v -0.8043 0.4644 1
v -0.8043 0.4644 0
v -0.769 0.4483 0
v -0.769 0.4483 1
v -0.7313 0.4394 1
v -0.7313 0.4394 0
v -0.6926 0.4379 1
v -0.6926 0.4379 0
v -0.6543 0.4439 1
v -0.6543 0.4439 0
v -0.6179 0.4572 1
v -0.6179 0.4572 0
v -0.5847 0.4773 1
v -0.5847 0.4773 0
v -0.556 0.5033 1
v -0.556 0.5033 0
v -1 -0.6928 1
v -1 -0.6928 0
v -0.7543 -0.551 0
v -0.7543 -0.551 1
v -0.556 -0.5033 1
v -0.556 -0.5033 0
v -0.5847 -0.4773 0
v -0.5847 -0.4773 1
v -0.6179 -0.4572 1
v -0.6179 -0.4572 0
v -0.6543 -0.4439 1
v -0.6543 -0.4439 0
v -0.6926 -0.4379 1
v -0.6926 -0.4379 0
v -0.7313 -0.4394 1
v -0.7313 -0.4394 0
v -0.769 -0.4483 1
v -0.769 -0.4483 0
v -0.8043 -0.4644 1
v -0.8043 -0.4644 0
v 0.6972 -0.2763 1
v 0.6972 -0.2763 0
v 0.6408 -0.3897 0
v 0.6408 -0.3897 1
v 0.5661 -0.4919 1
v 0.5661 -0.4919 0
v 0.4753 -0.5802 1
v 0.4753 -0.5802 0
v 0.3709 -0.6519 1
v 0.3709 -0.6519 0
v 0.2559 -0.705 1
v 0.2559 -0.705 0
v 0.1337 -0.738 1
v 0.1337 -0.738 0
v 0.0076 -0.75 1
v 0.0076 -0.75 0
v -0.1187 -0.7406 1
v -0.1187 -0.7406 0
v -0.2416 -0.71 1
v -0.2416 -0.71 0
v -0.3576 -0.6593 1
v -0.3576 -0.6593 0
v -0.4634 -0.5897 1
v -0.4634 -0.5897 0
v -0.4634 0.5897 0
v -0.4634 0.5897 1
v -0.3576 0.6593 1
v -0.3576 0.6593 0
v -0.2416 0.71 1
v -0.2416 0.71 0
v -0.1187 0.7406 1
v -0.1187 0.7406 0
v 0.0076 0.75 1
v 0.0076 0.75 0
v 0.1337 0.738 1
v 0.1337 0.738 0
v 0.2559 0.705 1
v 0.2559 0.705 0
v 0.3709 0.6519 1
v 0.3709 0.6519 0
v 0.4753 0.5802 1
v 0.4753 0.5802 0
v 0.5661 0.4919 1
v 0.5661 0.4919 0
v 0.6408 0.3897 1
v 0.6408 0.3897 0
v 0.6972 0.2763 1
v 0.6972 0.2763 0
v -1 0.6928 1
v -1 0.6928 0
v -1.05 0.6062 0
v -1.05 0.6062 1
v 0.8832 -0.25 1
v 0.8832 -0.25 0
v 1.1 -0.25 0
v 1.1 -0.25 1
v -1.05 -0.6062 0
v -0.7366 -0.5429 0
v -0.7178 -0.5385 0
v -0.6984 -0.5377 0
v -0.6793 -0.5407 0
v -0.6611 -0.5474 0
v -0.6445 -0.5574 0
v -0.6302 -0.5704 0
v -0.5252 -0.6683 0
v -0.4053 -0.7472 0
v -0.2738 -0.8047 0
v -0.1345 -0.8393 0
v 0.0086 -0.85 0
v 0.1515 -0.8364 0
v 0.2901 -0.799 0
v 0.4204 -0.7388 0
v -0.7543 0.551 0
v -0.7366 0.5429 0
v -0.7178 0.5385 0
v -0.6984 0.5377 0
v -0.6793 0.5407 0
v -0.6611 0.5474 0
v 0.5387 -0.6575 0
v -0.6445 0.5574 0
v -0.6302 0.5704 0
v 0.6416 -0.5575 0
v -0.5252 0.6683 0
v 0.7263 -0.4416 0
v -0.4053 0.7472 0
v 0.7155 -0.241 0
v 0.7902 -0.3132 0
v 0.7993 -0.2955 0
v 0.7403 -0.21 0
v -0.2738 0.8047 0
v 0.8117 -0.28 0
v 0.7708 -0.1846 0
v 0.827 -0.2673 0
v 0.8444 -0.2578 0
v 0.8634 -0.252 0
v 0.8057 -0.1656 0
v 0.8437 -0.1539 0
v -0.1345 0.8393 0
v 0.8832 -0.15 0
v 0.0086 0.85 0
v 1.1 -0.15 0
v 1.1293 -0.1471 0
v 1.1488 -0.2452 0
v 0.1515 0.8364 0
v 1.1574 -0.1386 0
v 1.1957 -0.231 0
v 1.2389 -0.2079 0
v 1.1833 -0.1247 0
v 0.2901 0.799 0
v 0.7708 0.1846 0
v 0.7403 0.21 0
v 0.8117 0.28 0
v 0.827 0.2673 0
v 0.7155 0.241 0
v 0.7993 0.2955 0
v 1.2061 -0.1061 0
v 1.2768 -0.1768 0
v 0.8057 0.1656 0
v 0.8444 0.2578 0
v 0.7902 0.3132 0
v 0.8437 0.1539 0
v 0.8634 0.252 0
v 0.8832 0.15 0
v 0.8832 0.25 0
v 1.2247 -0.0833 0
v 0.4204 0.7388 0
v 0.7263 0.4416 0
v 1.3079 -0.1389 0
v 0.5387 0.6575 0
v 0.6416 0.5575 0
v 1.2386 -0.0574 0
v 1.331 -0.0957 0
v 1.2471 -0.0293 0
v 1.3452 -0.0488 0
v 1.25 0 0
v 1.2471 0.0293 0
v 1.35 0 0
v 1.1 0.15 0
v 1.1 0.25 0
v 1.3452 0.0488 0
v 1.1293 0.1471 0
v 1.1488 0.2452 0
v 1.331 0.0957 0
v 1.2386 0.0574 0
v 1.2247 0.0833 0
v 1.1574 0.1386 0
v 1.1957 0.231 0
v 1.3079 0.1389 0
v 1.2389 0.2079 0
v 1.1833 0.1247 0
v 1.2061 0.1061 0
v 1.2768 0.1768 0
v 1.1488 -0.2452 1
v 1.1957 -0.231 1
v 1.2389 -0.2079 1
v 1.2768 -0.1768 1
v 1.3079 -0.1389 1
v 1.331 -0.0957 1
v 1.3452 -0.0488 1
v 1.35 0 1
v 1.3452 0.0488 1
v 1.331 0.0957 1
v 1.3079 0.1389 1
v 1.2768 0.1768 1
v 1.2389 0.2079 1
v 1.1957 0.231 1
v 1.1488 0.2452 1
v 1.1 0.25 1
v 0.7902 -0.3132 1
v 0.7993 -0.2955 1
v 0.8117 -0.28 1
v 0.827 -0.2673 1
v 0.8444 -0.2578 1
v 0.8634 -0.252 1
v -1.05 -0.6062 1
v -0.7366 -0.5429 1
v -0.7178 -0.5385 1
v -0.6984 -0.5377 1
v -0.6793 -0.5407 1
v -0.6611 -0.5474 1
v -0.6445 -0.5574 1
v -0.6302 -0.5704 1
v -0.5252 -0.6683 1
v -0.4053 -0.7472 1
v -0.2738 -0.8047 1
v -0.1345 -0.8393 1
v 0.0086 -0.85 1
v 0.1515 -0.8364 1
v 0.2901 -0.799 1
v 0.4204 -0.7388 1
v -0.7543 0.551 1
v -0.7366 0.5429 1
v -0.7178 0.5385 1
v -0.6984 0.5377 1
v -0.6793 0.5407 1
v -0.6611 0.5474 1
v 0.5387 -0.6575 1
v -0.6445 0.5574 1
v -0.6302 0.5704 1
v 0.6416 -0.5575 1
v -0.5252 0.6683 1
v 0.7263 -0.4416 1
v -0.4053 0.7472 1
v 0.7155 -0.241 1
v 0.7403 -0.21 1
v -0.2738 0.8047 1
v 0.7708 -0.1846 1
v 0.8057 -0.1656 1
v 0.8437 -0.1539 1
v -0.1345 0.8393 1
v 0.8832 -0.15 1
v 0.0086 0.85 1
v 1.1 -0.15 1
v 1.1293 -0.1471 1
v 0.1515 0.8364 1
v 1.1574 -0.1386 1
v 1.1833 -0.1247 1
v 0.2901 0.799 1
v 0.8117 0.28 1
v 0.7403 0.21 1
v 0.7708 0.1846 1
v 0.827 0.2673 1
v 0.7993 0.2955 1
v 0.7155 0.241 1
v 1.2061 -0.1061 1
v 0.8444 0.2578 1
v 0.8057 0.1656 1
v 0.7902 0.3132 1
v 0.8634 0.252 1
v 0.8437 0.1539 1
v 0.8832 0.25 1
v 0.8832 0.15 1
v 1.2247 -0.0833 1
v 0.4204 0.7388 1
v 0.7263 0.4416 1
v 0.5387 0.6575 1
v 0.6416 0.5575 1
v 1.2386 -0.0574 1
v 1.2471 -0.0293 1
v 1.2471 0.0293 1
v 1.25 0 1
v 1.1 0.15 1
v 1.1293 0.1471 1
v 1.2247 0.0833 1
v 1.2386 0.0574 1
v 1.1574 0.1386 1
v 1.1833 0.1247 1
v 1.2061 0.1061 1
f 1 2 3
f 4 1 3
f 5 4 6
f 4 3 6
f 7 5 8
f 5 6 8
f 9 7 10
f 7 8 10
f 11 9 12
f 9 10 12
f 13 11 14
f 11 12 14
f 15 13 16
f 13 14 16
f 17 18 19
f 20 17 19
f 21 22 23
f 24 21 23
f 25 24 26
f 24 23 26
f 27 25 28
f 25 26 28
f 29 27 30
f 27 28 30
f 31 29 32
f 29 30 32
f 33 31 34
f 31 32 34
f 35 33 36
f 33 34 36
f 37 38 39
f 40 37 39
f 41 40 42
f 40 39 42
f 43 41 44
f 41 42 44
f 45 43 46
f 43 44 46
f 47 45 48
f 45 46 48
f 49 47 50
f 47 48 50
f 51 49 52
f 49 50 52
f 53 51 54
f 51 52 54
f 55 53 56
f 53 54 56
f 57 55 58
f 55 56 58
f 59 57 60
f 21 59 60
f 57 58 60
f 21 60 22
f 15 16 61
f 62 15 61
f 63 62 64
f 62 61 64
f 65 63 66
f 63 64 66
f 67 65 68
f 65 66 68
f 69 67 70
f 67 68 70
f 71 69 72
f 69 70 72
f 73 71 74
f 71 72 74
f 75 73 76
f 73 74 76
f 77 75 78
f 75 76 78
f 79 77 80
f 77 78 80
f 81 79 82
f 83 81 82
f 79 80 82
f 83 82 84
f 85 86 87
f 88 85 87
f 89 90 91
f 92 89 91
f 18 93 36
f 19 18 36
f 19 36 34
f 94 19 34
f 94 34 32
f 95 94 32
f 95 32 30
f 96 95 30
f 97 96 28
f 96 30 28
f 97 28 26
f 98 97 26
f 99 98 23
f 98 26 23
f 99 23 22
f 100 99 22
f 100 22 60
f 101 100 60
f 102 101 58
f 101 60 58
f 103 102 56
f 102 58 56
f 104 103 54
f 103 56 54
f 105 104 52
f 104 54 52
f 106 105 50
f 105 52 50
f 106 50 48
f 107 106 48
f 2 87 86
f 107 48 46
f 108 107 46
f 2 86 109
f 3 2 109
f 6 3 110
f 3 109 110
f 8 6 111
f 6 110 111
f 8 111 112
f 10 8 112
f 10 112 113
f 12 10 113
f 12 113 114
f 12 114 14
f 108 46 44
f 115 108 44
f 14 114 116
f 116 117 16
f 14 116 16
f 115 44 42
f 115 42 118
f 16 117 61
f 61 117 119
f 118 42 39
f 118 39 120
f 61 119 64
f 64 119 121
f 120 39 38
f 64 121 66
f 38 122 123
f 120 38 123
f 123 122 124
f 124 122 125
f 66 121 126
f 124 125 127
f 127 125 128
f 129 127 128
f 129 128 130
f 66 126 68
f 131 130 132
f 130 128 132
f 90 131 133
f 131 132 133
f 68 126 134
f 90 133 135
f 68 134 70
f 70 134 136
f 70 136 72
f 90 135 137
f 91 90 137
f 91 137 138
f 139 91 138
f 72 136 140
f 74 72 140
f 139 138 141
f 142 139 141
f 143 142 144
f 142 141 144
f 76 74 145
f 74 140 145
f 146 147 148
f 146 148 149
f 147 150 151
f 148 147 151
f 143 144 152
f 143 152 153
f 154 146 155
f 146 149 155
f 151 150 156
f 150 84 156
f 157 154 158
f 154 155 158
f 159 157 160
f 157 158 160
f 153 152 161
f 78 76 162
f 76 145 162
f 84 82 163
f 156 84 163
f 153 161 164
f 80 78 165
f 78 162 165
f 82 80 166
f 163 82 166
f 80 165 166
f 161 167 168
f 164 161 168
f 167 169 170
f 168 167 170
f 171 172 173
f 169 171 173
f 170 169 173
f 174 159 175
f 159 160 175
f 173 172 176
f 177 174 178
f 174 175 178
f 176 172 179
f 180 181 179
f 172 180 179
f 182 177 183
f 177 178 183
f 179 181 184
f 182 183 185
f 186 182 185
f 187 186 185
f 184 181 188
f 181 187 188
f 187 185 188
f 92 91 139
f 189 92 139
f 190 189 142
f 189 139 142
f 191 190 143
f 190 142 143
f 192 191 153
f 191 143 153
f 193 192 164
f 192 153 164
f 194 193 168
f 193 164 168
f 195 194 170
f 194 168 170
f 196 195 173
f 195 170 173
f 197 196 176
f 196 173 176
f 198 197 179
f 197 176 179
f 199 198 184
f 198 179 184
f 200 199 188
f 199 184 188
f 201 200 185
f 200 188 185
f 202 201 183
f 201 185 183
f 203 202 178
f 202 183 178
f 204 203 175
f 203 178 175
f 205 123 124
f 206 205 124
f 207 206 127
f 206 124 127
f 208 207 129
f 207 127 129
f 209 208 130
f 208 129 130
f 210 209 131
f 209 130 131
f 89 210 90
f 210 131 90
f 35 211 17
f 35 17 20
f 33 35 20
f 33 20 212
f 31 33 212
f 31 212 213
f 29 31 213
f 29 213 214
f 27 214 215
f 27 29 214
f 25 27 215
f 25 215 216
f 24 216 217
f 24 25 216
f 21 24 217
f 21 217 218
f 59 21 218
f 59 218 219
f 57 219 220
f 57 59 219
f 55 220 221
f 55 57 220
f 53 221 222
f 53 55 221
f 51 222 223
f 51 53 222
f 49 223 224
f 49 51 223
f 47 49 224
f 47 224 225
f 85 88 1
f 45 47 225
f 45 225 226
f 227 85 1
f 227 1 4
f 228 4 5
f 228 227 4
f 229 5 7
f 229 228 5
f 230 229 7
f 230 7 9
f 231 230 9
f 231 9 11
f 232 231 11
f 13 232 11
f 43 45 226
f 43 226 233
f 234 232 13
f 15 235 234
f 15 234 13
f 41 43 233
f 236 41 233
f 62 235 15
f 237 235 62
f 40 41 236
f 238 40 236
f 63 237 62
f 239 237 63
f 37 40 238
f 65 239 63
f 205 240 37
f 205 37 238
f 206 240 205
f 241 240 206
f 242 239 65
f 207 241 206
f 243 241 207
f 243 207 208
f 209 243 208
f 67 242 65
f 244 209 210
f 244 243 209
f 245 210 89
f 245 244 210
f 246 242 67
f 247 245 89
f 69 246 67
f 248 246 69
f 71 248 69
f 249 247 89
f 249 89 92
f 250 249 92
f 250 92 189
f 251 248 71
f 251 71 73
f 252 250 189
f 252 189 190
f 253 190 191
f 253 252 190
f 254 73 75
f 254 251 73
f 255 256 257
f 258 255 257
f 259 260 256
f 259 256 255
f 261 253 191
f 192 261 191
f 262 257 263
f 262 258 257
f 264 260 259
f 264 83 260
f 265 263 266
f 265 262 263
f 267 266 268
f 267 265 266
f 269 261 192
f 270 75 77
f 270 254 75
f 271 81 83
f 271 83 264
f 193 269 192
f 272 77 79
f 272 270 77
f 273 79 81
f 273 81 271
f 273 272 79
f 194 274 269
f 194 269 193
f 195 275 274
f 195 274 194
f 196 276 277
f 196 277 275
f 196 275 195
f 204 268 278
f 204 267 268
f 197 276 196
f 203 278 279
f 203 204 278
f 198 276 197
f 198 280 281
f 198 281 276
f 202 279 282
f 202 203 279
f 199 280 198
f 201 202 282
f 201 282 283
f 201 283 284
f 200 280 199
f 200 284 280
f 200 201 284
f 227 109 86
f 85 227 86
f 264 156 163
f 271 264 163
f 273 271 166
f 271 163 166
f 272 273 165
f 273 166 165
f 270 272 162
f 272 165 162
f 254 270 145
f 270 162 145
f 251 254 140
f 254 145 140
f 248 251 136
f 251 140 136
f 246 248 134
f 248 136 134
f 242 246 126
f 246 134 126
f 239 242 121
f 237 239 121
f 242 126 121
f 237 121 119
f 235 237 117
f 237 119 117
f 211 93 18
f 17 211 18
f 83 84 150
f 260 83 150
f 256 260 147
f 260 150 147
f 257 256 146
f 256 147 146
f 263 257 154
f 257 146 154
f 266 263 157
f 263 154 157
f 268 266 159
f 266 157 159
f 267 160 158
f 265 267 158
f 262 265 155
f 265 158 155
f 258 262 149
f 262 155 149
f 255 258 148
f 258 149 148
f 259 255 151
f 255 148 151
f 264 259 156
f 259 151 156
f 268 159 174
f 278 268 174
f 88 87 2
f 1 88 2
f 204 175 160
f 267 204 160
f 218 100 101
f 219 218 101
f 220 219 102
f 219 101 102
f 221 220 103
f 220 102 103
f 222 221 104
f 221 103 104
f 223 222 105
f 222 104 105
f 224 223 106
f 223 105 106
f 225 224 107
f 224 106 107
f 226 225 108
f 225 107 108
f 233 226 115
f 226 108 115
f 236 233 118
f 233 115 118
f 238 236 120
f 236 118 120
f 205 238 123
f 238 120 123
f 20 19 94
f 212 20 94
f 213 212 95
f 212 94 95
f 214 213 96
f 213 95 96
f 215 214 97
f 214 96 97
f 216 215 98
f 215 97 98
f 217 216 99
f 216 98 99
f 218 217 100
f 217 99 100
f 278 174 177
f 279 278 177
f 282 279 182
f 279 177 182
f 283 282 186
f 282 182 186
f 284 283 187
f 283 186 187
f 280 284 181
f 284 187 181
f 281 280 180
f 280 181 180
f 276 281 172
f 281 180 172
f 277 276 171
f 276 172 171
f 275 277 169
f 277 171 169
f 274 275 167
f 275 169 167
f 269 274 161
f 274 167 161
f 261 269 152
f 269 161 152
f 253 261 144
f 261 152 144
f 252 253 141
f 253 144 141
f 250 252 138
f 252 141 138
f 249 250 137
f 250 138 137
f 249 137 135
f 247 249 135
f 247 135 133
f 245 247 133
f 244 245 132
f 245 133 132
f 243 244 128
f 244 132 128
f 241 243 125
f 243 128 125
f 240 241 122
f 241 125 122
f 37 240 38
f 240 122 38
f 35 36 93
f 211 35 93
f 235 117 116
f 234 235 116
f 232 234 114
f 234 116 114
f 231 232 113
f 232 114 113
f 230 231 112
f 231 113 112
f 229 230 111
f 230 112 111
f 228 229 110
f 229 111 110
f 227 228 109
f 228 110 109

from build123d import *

# Parameters (mm, degrees)
F1_DEPTH = 1


with BuildPart() as f1:
    # F0 (on Top) → F1 (new body)
    with BuildSketch(Plane.XY):
        with BuildLine():
            ThreePointArc((-0.556015, 0.503336), (0.133683, 0.73799), (0.697244, 0.276316))
            ThreePointArc((0.697244, 0.276316), (0.770786, 0.184566), (0.883176, 0.15))
            Line((0.883176, 0.15), (1.1, 0.15))
            ThreePointArc((1.1, 0.15), (1.25, 0), (1.1, -0.15))
            Line((1.1, -0.15), (0.883176, -0.15))
            ThreePointArc((0.883176, -0.15), (0.770786, -0.184566), (0.697244, -0.276316))
            ThreePointArc((0.697244, -0.276316), (0.133683, -0.73799), (-0.556015, -0.503336))
            ThreePointArc((-0.556015, -0.503336), (-0.673263, -0.43998), (-0.804285, -0.464354))
            Line((-0.804285, -0.464354), (-1.05, -0.606218))
            Line((-1.05, -0.606218), (-1, -0.69282))
            Line((-1, -0.69282), (-0.754285, -0.550957))
            ThreePointArc((-0.754285, -0.550957), (-0.688774, -0.53877), (-0.63015, -0.570448))
            ThreePointArc((-0.63015, -0.570448), (0.151507, -0.836388), (0.79021, -0.313158))
            ThreePointArc((0.79021, -0.313158), (0.826981, -0.267283), (0.883176, -0.25))
            Line((0.883176, -0.25), (1.1, -0.25))
            ThreePointArc((1.1, -0.25), (1.35, 0), (1.1, 0.25))
            Line((1.1, 0.25), (0.883176, 0.25))
            ThreePointArc((0.883176, 0.25), (0.826981, 0.267283), (0.79021, 0.313158))
            ThreePointArc((0.79021, 0.313158), (0.151507, 0.836388), (-0.63015, 0.570448))
            ThreePointArc((-0.63015, 0.570448), (-0.688774, 0.53877), (-0.754285, 0.550957))
            Line((-0.754285, 0.550957), (-1, 0.69282))
            Line((-1, 0.69282), (-1.05, 0.606218))
            Line((-1.05, 0.606218), (-0.804285, 0.464354))
            ThreePointArc((-0.804285, 0.464354), (-0.673263, 0.43998), (-0.556015, 0.503336))
        make_face()
    extrude(amount=F1_DEPTH)


solid = f1.part
